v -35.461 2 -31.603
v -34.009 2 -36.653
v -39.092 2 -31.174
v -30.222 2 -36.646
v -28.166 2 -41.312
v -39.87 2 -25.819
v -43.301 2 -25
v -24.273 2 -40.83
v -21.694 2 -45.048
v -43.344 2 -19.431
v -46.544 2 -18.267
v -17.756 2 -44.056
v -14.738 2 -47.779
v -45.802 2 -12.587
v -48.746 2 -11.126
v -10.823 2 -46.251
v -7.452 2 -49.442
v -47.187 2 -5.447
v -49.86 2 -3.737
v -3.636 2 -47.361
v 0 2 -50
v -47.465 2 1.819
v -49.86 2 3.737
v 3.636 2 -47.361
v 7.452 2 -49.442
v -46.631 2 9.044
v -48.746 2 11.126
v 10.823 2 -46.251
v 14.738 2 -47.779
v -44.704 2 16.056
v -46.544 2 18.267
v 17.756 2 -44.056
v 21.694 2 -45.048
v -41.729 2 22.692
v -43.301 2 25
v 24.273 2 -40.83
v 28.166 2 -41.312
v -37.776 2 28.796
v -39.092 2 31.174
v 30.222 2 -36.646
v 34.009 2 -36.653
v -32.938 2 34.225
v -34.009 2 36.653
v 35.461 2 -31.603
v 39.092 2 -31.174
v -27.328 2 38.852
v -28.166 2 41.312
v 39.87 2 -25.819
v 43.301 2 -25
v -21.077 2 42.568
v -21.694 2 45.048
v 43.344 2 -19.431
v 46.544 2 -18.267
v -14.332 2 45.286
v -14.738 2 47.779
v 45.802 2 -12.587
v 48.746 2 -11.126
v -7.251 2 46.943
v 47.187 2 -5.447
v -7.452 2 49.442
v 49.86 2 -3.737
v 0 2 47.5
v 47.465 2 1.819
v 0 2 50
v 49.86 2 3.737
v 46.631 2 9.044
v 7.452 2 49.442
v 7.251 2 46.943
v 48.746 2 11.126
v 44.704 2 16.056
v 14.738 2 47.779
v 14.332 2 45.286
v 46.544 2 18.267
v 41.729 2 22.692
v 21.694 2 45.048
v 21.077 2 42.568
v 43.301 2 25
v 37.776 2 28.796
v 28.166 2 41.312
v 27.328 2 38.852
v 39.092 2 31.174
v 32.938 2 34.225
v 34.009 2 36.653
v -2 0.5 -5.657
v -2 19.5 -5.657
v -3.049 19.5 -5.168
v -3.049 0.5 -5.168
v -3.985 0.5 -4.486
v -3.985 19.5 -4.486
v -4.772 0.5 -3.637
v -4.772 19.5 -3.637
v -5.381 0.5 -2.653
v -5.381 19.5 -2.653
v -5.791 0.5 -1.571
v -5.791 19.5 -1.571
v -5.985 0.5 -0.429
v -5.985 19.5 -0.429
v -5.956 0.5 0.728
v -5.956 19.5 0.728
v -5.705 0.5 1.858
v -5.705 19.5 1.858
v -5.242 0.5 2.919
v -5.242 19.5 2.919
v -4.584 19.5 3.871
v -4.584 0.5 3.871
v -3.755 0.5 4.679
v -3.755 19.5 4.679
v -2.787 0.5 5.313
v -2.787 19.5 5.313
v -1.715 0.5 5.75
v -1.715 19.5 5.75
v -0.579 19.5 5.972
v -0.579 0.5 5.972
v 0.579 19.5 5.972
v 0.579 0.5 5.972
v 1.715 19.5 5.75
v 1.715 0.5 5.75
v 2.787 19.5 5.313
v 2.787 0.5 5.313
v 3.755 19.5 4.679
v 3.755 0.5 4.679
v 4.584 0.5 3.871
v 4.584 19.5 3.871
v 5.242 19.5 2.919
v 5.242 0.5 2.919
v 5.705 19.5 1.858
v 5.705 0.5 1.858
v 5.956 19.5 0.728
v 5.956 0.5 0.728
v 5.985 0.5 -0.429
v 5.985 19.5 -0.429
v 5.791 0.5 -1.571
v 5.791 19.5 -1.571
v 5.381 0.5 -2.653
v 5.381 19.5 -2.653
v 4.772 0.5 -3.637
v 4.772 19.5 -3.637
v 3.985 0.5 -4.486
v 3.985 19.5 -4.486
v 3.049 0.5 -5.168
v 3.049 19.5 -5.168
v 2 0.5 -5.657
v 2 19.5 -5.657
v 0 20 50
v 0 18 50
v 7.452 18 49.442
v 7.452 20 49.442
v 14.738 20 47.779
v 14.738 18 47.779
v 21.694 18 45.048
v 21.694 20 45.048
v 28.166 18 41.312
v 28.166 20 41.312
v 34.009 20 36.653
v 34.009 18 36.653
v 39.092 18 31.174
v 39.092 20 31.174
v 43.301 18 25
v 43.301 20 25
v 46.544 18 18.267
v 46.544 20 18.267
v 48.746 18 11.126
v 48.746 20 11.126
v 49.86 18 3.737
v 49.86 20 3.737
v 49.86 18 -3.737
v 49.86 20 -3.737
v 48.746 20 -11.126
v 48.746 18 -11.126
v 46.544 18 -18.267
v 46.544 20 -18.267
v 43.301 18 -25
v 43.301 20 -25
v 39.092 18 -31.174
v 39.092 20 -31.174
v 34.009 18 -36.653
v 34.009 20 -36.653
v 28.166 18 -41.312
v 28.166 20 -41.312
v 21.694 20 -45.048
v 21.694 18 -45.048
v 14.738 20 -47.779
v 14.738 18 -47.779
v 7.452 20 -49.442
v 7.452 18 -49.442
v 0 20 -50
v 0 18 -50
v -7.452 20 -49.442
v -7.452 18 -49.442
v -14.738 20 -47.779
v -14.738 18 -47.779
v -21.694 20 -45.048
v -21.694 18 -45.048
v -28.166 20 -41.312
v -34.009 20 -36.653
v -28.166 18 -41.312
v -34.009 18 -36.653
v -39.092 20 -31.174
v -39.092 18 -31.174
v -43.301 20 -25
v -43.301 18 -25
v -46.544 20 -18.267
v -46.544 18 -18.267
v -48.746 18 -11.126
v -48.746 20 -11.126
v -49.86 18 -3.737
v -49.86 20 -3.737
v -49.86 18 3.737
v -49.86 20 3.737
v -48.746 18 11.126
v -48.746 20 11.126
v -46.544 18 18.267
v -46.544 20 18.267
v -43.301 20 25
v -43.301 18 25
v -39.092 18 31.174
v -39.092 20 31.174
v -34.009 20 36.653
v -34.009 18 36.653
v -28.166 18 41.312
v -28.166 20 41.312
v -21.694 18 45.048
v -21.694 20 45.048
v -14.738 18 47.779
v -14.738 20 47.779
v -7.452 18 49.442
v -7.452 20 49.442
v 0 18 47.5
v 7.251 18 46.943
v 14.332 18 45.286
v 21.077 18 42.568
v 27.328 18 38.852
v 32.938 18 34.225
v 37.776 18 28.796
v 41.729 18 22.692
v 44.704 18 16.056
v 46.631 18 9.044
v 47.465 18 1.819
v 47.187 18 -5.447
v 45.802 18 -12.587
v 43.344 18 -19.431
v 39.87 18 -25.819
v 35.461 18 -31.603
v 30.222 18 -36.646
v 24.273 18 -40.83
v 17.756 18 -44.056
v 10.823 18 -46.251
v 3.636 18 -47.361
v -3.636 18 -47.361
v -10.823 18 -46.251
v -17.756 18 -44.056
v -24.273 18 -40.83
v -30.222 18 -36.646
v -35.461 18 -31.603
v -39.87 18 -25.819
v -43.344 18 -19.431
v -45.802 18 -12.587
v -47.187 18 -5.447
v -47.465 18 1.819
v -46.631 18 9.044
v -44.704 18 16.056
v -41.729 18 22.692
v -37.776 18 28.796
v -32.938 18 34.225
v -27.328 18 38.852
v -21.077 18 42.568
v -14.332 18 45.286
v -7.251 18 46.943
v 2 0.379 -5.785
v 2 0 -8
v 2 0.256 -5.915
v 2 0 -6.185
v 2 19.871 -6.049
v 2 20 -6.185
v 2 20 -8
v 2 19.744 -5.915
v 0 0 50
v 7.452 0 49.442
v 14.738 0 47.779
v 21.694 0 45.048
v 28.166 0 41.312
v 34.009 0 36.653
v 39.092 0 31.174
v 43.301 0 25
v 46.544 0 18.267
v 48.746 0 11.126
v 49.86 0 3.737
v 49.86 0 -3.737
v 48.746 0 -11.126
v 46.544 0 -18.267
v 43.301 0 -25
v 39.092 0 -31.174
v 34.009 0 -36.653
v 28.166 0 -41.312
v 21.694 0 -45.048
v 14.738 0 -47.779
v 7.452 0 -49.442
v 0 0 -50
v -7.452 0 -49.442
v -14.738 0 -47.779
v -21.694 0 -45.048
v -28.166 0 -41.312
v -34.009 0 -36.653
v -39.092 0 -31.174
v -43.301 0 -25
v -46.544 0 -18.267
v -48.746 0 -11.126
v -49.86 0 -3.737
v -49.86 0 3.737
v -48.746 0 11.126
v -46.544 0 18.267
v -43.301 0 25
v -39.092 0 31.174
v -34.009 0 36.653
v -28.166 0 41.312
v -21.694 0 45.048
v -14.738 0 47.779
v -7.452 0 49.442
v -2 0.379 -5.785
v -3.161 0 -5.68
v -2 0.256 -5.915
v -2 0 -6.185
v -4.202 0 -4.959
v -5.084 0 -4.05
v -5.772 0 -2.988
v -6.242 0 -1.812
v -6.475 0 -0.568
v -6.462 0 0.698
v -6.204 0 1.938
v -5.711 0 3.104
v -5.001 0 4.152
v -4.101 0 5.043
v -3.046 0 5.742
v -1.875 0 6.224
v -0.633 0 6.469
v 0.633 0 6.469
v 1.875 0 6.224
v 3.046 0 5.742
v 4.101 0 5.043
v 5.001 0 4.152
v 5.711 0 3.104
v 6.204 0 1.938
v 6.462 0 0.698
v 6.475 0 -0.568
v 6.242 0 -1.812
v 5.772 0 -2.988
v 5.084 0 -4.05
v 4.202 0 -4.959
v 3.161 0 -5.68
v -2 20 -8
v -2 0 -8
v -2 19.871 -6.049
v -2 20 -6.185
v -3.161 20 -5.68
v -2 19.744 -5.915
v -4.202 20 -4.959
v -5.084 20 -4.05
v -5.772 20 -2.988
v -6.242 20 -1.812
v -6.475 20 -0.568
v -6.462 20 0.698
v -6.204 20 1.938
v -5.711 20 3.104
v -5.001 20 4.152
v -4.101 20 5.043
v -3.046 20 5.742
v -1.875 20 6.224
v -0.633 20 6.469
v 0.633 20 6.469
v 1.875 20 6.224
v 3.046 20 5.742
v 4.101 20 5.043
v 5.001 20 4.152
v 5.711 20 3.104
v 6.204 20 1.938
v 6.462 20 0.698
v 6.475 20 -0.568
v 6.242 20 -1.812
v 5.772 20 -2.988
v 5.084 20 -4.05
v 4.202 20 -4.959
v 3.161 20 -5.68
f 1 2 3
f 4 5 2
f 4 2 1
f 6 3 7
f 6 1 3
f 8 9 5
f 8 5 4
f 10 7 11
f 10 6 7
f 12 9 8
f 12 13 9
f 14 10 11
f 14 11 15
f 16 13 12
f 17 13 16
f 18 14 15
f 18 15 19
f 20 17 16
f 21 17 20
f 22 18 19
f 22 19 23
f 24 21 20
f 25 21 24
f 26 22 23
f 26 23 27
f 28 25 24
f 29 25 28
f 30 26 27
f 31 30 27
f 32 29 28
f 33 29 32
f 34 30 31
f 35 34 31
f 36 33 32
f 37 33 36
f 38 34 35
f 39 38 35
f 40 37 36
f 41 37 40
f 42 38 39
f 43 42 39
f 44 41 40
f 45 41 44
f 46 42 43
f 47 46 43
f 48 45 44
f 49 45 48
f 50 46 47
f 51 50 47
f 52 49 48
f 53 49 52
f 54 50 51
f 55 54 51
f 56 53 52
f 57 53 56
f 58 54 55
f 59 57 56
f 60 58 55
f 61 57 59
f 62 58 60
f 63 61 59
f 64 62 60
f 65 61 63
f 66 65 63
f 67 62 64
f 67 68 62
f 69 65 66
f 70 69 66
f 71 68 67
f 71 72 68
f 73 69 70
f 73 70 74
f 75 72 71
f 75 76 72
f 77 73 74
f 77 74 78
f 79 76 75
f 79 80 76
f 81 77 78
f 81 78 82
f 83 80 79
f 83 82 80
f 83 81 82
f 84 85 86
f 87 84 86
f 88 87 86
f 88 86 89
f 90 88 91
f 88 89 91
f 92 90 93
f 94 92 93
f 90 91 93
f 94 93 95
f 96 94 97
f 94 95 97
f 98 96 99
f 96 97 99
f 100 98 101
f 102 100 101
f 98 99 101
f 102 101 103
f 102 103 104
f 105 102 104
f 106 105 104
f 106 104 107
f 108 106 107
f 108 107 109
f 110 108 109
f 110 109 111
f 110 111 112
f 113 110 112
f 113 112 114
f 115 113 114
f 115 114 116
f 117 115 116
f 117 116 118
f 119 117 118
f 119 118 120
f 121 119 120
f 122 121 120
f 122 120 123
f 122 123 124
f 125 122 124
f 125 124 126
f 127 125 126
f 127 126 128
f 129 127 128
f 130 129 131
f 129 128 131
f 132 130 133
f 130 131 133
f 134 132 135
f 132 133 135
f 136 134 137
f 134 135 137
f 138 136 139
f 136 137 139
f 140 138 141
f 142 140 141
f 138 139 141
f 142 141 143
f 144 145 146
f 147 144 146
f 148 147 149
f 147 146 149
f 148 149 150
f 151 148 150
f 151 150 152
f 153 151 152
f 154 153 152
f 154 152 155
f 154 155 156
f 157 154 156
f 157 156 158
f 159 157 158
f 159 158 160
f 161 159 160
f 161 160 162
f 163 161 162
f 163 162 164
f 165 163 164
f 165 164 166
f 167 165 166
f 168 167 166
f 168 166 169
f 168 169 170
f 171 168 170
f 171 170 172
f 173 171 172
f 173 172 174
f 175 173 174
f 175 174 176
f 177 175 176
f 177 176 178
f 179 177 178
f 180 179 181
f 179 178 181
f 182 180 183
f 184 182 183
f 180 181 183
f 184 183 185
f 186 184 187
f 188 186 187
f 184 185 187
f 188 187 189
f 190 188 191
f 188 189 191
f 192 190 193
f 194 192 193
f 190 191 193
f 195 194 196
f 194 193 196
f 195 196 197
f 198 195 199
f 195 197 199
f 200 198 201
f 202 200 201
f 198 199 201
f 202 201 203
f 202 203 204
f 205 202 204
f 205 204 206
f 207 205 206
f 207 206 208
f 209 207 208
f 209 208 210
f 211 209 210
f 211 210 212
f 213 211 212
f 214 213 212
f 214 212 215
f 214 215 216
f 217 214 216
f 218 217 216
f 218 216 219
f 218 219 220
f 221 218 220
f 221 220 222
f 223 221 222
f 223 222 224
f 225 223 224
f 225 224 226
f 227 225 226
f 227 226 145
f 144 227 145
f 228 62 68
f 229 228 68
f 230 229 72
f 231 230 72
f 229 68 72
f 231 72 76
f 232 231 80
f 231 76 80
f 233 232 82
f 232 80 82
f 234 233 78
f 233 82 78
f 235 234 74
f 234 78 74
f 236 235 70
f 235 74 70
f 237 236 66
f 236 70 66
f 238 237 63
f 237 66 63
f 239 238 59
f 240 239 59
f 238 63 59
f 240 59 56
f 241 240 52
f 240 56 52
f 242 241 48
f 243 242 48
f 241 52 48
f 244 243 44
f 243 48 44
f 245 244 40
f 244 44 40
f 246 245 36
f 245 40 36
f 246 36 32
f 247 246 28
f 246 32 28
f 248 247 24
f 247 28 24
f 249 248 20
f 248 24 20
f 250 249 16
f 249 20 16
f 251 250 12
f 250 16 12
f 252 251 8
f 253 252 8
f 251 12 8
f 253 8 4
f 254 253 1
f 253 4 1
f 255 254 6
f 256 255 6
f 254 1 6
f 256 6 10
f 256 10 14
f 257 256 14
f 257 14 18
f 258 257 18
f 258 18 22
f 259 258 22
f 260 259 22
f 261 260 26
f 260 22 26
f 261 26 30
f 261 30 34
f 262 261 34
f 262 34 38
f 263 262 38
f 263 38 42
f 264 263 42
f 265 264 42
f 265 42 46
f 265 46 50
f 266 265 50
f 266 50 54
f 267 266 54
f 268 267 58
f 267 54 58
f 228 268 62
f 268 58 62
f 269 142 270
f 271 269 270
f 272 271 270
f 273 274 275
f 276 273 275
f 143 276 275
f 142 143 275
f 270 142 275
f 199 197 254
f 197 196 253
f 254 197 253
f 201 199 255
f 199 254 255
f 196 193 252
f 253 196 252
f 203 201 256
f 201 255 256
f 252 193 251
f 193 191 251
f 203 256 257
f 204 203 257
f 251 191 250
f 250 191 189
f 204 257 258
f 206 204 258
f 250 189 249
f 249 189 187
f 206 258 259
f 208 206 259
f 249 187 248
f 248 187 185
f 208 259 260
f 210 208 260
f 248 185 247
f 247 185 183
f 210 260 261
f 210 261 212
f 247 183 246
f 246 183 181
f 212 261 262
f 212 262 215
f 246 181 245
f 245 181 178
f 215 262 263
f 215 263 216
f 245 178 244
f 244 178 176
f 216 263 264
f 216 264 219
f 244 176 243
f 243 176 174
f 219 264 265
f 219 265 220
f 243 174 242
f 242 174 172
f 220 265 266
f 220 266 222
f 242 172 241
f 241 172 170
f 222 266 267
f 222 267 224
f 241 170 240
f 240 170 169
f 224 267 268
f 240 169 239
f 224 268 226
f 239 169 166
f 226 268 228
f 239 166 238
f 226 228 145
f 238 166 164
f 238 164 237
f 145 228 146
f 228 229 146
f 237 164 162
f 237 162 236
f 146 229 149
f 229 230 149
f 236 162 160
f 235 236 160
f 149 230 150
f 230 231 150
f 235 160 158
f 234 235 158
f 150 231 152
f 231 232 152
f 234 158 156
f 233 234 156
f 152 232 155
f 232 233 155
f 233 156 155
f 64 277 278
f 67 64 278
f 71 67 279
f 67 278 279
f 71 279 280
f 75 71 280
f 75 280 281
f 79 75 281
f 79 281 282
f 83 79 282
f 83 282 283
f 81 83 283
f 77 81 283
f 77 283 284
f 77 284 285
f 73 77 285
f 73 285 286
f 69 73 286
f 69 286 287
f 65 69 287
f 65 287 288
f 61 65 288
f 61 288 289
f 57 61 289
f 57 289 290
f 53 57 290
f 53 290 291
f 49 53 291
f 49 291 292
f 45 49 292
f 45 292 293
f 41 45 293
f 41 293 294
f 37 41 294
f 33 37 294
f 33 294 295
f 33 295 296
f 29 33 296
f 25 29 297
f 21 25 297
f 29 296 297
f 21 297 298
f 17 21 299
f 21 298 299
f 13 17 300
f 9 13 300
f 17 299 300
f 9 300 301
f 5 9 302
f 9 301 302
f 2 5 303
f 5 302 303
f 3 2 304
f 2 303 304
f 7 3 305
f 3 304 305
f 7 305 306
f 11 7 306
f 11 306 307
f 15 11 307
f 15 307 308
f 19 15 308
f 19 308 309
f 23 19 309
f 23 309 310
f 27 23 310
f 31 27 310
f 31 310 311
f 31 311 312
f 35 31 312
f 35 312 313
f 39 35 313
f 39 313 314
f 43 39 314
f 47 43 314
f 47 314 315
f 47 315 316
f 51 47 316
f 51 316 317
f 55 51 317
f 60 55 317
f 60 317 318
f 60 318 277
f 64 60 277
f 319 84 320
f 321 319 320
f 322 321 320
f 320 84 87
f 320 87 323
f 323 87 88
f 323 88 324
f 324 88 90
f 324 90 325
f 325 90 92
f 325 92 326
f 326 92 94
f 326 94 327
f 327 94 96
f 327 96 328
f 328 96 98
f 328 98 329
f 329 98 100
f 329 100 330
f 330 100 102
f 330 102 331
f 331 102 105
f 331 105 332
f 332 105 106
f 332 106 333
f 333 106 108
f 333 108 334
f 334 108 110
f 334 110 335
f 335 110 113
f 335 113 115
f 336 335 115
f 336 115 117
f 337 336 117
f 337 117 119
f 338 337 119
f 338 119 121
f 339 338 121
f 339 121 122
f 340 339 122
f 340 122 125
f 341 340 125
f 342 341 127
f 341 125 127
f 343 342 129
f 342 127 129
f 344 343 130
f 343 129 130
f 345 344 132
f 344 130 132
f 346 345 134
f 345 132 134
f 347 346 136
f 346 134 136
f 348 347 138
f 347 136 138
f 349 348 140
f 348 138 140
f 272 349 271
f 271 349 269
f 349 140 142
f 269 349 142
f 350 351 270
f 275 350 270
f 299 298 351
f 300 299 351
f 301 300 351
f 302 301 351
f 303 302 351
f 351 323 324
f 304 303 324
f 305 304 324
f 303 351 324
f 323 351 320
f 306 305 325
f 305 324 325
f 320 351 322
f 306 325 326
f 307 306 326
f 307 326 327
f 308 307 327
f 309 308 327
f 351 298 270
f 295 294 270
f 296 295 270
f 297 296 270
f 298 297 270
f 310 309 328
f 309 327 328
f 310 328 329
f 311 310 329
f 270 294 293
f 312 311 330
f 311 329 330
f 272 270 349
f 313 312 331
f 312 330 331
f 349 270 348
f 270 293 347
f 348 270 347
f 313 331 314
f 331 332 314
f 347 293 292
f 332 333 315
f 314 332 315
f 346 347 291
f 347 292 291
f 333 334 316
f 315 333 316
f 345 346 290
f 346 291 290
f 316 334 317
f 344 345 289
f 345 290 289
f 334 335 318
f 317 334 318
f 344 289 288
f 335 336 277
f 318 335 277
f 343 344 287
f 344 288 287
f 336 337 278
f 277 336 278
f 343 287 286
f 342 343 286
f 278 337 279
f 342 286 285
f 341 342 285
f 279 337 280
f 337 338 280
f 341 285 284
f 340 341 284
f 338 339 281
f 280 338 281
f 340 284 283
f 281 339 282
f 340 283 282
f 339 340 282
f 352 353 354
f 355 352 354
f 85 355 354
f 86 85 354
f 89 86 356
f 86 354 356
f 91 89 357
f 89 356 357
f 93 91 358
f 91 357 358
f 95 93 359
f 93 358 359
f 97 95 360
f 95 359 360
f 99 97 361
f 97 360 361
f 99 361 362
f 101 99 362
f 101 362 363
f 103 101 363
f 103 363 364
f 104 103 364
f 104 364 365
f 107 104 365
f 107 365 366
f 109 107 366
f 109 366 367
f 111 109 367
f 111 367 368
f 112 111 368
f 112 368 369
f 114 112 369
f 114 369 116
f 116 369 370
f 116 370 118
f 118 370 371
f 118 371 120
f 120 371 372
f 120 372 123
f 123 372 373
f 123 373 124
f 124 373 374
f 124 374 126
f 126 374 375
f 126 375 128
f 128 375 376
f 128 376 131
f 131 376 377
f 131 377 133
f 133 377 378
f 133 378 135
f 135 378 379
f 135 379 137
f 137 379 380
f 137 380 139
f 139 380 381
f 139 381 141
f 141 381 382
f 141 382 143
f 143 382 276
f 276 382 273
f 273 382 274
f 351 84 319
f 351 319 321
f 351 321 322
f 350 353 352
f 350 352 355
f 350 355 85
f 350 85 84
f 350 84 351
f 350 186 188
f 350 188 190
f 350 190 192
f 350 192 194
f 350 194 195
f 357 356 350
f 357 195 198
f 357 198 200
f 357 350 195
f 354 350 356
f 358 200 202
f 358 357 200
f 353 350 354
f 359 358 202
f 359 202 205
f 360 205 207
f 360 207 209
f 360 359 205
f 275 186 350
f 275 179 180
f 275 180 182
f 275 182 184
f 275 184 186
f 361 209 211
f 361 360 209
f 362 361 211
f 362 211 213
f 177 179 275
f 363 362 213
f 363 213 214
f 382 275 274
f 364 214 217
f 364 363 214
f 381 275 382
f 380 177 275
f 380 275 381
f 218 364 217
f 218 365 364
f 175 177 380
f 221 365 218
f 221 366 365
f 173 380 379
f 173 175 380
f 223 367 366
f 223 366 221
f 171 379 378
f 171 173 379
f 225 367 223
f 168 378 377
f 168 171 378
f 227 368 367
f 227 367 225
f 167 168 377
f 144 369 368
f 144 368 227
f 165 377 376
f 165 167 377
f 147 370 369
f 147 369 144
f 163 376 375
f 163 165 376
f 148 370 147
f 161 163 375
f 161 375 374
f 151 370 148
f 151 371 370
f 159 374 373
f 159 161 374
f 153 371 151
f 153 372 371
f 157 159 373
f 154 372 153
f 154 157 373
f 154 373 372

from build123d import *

# Parameters (mm, degrees)
SKETCH_1_R          = 50
EXTRUDE_1_DEPTH     = 20
CUT_EXTRUDE_START   = -18
SKETCH_2_R          = 50
SKETCH_2_R_2        = 47.5
CUT_EXTRUDE_1_DEPTH = 16
SKETCH_3_R          = 6
CUT_EXTRUDE_2_DEPTH = 74.484692283
CHAMFER_1_SIZE      = 0.5
SKETCH_4_W          = 4
SKETCH_4_H          = 8.342964167
CUT_EXTRUDE_3_DEPTH = 74.484692283


with BuildPart() as part:
    # 草图1 → 凸台-拉伸1 (new body)
    with BuildSketch(Plane(origin=(0, 0, 0), x_dir=(1, 0, 0), z_dir=(0, 1, 0))):
        with Locations(Location((0, 0, 0), (0, 0, 270))):
            Circle(SKETCH_1_R)
    extrude(amount=EXTRUDE_1_DEPTH)

    # 草图2 → 切除-拉伸1 (cut)
    with BuildSketch(Plane(origin=(0, 20, 0), x_dir=(1, 0, 0), z_dir=(0, 1, 0)).offset(CUT_EXTRUDE_START)):
        with Locations(Location((0, 0, 0), (0, 0, 270))):
            Circle(SKETCH_2_R)
        with Locations(Location((0, 0, 0), (0, 0, 270))):
            Circle(SKETCH_2_R_2, mode=Mode.SUBTRACT)
    extrude(amount=CUT_EXTRUDE_1_DEPTH, mode=Mode.SUBTRACT)

    # 草图3 → 切除-拉伸2 (cut, through all)
    with BuildSketch(Plane(origin=(0, 20, 0), x_dir=(1, 0, 0), z_dir=(0, 1, 0))):
        with Locations(Location((0, 0, 0), (0, 0, 270))):
            Circle(SKETCH_3_R)
    extrude(amount=-CUT_EXTRUDE_2_DEPTH, mode=Mode.SUBTRACT)

    # 倒角1
    chamfer_1_edges = [part.edges().sort_by_distance(p)[0] for p in [
        (0, 0, -6),
        (0, 20, -6),
    ]]
    chamfer(chamfer_1_edges, length=CHAMFER_1_SIZE)

    # 草图4 → 切除-拉伸3 (cut, through all)
    with BuildSketch(Plane(origin=(0, 20, 0), x_dir=(1, 0, 0), z_dir=(0, 1, 0))):
        with Locations((0, 3.828517917)):
            Rectangle(SKETCH_4_W, SKETCH_4_H)
    extrude(amount=-CUT_EXTRUDE_3_DEPTH, mode=Mode.SUBTRACT)


solid = part.part
